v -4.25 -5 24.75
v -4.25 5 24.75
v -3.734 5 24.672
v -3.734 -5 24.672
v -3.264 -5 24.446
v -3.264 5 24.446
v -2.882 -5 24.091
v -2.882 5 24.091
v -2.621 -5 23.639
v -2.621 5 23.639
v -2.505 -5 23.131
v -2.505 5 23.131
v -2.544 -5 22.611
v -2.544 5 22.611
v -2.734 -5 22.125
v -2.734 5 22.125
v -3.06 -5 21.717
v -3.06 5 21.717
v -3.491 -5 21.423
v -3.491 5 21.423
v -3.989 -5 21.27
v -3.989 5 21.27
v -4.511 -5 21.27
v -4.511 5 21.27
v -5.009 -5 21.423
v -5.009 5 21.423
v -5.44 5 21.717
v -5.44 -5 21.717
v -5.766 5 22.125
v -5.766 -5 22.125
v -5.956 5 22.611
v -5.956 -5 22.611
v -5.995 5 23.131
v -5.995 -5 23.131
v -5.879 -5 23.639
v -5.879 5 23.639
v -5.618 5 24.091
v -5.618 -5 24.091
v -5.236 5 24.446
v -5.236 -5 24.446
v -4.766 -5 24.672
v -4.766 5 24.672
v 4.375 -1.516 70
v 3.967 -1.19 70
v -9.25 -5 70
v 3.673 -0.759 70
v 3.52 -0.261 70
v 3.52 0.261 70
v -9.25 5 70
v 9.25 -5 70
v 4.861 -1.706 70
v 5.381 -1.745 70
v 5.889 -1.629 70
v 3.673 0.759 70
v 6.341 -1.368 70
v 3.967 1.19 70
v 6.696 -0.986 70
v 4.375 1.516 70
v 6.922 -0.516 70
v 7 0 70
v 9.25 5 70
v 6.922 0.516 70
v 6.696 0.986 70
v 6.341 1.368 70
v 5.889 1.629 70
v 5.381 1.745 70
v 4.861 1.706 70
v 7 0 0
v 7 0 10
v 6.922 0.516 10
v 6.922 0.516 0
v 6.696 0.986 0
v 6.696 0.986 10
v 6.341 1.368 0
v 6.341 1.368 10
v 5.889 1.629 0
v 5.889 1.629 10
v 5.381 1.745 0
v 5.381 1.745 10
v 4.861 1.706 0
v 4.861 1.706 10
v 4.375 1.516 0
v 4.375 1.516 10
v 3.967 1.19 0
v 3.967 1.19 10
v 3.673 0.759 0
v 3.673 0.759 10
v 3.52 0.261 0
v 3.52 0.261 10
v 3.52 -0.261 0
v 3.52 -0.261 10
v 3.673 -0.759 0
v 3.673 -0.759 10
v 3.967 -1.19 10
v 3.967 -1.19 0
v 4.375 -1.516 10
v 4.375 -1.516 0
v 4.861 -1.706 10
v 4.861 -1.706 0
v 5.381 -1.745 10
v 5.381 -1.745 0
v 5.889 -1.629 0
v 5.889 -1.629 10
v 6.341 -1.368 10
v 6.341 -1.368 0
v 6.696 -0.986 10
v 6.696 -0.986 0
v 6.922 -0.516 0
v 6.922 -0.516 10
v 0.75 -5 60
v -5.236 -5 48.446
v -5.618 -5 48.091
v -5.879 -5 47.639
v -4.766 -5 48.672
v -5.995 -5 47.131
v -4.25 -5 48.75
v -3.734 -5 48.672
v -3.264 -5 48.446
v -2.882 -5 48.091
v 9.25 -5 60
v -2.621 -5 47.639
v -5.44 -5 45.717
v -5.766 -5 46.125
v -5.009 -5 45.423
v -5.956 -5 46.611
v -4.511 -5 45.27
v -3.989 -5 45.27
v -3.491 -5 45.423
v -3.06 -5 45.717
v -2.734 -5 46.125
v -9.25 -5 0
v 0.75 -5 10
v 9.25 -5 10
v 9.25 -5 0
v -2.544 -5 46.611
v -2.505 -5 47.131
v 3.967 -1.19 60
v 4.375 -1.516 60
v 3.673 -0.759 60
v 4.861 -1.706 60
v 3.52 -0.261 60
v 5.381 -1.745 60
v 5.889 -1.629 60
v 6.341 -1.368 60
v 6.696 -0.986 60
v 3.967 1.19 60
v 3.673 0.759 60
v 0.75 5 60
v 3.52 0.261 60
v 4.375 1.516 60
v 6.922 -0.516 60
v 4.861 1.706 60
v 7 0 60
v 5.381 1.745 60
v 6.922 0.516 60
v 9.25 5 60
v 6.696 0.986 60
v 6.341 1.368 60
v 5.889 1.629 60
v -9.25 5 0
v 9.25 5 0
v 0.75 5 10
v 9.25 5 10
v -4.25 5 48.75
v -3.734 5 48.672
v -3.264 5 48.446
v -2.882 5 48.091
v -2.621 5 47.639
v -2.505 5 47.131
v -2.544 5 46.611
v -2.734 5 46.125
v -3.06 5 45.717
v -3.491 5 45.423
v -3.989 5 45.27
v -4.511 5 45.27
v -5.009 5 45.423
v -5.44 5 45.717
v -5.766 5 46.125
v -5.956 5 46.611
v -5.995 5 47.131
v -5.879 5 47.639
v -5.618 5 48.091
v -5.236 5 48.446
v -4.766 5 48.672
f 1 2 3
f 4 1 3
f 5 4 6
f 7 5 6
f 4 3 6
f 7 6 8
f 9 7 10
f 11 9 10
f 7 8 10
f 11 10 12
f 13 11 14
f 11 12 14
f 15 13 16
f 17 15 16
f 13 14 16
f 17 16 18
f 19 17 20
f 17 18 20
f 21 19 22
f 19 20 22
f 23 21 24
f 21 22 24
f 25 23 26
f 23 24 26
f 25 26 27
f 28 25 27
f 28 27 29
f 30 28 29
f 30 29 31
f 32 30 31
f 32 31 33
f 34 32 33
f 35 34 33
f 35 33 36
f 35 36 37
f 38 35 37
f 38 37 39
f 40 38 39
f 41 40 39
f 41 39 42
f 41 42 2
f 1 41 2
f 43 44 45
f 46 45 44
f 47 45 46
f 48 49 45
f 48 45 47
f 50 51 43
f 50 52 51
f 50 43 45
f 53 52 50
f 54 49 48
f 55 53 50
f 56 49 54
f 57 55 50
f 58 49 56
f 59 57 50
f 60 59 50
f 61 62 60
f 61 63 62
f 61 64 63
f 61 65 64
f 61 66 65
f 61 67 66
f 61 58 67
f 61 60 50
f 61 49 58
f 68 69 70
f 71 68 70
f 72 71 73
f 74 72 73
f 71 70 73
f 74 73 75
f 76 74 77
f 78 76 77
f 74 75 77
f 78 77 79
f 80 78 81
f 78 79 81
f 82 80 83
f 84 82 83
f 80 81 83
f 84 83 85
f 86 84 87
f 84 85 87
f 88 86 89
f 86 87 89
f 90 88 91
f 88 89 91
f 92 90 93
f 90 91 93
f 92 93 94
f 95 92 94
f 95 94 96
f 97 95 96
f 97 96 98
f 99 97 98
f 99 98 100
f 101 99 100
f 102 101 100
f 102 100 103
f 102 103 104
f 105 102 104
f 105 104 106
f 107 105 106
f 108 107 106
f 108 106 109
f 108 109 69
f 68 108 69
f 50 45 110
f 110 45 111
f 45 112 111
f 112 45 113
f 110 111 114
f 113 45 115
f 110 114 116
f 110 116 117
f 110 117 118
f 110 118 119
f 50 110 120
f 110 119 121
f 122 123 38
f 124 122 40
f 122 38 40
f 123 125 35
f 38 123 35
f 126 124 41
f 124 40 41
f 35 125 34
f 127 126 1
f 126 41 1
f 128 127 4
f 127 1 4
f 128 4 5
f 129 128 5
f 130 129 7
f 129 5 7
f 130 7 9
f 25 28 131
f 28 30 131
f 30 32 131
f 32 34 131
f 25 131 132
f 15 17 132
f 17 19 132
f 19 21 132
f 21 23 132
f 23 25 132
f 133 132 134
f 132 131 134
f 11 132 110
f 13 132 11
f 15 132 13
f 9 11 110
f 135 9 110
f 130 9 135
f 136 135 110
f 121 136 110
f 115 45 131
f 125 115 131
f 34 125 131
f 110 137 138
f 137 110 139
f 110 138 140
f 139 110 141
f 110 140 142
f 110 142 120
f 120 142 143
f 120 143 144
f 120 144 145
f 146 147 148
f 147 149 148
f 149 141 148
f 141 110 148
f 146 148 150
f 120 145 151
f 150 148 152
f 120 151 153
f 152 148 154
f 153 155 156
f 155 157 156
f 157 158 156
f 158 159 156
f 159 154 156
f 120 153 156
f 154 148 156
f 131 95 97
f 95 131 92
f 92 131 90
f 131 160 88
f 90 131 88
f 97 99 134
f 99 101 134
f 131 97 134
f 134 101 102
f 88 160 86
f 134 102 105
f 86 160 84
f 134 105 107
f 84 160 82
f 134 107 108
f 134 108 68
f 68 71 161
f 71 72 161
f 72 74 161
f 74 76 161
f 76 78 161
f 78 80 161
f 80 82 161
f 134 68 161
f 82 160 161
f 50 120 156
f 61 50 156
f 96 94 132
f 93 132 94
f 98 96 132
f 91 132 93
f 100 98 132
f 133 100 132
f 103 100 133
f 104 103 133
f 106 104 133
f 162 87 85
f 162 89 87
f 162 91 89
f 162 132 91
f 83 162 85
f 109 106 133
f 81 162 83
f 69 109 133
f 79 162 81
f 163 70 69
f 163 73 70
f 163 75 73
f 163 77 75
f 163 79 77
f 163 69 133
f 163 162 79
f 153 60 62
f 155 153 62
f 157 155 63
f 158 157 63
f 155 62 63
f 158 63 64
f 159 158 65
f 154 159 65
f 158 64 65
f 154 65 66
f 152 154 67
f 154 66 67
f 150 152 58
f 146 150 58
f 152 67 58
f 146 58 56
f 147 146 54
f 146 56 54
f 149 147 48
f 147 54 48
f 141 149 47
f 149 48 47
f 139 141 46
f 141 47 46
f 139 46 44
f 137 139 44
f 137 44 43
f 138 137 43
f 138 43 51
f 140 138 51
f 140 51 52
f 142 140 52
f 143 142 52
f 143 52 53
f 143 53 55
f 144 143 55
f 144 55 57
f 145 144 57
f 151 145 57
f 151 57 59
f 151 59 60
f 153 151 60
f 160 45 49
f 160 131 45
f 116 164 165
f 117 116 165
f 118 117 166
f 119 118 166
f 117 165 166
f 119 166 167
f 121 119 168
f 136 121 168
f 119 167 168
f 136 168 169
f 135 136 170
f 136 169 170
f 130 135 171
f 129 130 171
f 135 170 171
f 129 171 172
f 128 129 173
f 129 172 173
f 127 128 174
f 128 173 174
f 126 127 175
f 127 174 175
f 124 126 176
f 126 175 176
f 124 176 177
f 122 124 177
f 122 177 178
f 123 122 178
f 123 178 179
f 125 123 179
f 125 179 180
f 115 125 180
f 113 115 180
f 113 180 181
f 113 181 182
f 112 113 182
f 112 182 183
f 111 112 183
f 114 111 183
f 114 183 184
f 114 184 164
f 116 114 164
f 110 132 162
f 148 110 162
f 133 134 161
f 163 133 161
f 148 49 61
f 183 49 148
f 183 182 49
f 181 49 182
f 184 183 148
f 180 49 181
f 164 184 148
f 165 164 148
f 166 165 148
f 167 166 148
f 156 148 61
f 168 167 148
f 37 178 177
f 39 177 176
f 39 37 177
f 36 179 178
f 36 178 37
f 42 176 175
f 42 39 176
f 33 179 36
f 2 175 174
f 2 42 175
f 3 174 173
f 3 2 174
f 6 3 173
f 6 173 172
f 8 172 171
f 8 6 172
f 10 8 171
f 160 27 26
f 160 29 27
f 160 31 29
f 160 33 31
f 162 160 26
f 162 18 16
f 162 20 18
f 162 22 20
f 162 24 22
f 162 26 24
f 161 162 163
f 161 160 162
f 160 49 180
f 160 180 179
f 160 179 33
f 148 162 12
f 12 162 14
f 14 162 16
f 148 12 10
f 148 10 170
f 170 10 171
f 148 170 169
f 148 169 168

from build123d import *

# Parameters (mm, degrees)
SKETCH1_W           = 18.5
SKETCH1_H           = 10
BOSS_EXTRUDE1_DEPTH = 10
SKETCH2_W           = 10
SKETCH2_H           = 10
BOSS_EXTRUDE2_DEPTH = 50
SKETCH3_W           = 18.5
SKETCH3_H           = 10
BOSS_EXTRUDE3_DEPTH = 10
SKETCH4_R           = 1.75
CUT_EXTRUDE1_DEPTH  = 71.785326869
SKETCH5_R           = 1.75
CUT_EXTRUDE2_DEPTH  = 72.313129927


with BuildPart() as part:
    # Sketch1 → Boss-Extrude1 (new body)
    with BuildSketch(Plane.XY):
        Rectangle(SKETCH1_W, SKETCH1_H)
    extrude(amount=BOSS_EXTRUDE1_DEPTH)

    # Sketch2 → Boss-Extrude2 (add)
    with BuildSketch(Plane.XY.offset(10)):
        with Locations((-4.25, 0)):
            Rectangle(SKETCH2_W, SKETCH2_H)
    extrude(amount=BOSS_EXTRUDE2_DEPTH)

    # Sketch3 → Boss-Extrude3 (add)
    with BuildSketch(Plane.XY.offset(60)):
        Rectangle(SKETCH3_W, SKETCH3_H)
    extrude(amount=BOSS_EXTRUDE3_DEPTH)

    # Sketch4 → Cut-Extrude1 (cut, through all)
    with BuildSketch(Plane.XY.offset(70)):
        with Locations((5.25, 0)):
            Circle(SKETCH4_R)
    extrude(amount=-CUT_EXTRUDE1_DEPTH, mode=Mode.SUBTRACT)

    # Sketch5 → Cut-Extrude2 (cut, through all)
    with BuildSketch(Plane(origin=(0, 5, 0), x_dir=(1, 0, 0), z_dir=(0, 1, 0))):
        with Locations(Location((-4.25, -23, 0), (0, 0, 270))):
            Circle(SKETCH5_R)
        with Locations(Location((-4.25, -47, 0), (0, 0, 270))):
            Circle(SKETCH5_R)
    extrude(amount=-CUT_EXTRUDE2_DEPTH, mode=Mode.SUBTRACT)


solid = part.part
